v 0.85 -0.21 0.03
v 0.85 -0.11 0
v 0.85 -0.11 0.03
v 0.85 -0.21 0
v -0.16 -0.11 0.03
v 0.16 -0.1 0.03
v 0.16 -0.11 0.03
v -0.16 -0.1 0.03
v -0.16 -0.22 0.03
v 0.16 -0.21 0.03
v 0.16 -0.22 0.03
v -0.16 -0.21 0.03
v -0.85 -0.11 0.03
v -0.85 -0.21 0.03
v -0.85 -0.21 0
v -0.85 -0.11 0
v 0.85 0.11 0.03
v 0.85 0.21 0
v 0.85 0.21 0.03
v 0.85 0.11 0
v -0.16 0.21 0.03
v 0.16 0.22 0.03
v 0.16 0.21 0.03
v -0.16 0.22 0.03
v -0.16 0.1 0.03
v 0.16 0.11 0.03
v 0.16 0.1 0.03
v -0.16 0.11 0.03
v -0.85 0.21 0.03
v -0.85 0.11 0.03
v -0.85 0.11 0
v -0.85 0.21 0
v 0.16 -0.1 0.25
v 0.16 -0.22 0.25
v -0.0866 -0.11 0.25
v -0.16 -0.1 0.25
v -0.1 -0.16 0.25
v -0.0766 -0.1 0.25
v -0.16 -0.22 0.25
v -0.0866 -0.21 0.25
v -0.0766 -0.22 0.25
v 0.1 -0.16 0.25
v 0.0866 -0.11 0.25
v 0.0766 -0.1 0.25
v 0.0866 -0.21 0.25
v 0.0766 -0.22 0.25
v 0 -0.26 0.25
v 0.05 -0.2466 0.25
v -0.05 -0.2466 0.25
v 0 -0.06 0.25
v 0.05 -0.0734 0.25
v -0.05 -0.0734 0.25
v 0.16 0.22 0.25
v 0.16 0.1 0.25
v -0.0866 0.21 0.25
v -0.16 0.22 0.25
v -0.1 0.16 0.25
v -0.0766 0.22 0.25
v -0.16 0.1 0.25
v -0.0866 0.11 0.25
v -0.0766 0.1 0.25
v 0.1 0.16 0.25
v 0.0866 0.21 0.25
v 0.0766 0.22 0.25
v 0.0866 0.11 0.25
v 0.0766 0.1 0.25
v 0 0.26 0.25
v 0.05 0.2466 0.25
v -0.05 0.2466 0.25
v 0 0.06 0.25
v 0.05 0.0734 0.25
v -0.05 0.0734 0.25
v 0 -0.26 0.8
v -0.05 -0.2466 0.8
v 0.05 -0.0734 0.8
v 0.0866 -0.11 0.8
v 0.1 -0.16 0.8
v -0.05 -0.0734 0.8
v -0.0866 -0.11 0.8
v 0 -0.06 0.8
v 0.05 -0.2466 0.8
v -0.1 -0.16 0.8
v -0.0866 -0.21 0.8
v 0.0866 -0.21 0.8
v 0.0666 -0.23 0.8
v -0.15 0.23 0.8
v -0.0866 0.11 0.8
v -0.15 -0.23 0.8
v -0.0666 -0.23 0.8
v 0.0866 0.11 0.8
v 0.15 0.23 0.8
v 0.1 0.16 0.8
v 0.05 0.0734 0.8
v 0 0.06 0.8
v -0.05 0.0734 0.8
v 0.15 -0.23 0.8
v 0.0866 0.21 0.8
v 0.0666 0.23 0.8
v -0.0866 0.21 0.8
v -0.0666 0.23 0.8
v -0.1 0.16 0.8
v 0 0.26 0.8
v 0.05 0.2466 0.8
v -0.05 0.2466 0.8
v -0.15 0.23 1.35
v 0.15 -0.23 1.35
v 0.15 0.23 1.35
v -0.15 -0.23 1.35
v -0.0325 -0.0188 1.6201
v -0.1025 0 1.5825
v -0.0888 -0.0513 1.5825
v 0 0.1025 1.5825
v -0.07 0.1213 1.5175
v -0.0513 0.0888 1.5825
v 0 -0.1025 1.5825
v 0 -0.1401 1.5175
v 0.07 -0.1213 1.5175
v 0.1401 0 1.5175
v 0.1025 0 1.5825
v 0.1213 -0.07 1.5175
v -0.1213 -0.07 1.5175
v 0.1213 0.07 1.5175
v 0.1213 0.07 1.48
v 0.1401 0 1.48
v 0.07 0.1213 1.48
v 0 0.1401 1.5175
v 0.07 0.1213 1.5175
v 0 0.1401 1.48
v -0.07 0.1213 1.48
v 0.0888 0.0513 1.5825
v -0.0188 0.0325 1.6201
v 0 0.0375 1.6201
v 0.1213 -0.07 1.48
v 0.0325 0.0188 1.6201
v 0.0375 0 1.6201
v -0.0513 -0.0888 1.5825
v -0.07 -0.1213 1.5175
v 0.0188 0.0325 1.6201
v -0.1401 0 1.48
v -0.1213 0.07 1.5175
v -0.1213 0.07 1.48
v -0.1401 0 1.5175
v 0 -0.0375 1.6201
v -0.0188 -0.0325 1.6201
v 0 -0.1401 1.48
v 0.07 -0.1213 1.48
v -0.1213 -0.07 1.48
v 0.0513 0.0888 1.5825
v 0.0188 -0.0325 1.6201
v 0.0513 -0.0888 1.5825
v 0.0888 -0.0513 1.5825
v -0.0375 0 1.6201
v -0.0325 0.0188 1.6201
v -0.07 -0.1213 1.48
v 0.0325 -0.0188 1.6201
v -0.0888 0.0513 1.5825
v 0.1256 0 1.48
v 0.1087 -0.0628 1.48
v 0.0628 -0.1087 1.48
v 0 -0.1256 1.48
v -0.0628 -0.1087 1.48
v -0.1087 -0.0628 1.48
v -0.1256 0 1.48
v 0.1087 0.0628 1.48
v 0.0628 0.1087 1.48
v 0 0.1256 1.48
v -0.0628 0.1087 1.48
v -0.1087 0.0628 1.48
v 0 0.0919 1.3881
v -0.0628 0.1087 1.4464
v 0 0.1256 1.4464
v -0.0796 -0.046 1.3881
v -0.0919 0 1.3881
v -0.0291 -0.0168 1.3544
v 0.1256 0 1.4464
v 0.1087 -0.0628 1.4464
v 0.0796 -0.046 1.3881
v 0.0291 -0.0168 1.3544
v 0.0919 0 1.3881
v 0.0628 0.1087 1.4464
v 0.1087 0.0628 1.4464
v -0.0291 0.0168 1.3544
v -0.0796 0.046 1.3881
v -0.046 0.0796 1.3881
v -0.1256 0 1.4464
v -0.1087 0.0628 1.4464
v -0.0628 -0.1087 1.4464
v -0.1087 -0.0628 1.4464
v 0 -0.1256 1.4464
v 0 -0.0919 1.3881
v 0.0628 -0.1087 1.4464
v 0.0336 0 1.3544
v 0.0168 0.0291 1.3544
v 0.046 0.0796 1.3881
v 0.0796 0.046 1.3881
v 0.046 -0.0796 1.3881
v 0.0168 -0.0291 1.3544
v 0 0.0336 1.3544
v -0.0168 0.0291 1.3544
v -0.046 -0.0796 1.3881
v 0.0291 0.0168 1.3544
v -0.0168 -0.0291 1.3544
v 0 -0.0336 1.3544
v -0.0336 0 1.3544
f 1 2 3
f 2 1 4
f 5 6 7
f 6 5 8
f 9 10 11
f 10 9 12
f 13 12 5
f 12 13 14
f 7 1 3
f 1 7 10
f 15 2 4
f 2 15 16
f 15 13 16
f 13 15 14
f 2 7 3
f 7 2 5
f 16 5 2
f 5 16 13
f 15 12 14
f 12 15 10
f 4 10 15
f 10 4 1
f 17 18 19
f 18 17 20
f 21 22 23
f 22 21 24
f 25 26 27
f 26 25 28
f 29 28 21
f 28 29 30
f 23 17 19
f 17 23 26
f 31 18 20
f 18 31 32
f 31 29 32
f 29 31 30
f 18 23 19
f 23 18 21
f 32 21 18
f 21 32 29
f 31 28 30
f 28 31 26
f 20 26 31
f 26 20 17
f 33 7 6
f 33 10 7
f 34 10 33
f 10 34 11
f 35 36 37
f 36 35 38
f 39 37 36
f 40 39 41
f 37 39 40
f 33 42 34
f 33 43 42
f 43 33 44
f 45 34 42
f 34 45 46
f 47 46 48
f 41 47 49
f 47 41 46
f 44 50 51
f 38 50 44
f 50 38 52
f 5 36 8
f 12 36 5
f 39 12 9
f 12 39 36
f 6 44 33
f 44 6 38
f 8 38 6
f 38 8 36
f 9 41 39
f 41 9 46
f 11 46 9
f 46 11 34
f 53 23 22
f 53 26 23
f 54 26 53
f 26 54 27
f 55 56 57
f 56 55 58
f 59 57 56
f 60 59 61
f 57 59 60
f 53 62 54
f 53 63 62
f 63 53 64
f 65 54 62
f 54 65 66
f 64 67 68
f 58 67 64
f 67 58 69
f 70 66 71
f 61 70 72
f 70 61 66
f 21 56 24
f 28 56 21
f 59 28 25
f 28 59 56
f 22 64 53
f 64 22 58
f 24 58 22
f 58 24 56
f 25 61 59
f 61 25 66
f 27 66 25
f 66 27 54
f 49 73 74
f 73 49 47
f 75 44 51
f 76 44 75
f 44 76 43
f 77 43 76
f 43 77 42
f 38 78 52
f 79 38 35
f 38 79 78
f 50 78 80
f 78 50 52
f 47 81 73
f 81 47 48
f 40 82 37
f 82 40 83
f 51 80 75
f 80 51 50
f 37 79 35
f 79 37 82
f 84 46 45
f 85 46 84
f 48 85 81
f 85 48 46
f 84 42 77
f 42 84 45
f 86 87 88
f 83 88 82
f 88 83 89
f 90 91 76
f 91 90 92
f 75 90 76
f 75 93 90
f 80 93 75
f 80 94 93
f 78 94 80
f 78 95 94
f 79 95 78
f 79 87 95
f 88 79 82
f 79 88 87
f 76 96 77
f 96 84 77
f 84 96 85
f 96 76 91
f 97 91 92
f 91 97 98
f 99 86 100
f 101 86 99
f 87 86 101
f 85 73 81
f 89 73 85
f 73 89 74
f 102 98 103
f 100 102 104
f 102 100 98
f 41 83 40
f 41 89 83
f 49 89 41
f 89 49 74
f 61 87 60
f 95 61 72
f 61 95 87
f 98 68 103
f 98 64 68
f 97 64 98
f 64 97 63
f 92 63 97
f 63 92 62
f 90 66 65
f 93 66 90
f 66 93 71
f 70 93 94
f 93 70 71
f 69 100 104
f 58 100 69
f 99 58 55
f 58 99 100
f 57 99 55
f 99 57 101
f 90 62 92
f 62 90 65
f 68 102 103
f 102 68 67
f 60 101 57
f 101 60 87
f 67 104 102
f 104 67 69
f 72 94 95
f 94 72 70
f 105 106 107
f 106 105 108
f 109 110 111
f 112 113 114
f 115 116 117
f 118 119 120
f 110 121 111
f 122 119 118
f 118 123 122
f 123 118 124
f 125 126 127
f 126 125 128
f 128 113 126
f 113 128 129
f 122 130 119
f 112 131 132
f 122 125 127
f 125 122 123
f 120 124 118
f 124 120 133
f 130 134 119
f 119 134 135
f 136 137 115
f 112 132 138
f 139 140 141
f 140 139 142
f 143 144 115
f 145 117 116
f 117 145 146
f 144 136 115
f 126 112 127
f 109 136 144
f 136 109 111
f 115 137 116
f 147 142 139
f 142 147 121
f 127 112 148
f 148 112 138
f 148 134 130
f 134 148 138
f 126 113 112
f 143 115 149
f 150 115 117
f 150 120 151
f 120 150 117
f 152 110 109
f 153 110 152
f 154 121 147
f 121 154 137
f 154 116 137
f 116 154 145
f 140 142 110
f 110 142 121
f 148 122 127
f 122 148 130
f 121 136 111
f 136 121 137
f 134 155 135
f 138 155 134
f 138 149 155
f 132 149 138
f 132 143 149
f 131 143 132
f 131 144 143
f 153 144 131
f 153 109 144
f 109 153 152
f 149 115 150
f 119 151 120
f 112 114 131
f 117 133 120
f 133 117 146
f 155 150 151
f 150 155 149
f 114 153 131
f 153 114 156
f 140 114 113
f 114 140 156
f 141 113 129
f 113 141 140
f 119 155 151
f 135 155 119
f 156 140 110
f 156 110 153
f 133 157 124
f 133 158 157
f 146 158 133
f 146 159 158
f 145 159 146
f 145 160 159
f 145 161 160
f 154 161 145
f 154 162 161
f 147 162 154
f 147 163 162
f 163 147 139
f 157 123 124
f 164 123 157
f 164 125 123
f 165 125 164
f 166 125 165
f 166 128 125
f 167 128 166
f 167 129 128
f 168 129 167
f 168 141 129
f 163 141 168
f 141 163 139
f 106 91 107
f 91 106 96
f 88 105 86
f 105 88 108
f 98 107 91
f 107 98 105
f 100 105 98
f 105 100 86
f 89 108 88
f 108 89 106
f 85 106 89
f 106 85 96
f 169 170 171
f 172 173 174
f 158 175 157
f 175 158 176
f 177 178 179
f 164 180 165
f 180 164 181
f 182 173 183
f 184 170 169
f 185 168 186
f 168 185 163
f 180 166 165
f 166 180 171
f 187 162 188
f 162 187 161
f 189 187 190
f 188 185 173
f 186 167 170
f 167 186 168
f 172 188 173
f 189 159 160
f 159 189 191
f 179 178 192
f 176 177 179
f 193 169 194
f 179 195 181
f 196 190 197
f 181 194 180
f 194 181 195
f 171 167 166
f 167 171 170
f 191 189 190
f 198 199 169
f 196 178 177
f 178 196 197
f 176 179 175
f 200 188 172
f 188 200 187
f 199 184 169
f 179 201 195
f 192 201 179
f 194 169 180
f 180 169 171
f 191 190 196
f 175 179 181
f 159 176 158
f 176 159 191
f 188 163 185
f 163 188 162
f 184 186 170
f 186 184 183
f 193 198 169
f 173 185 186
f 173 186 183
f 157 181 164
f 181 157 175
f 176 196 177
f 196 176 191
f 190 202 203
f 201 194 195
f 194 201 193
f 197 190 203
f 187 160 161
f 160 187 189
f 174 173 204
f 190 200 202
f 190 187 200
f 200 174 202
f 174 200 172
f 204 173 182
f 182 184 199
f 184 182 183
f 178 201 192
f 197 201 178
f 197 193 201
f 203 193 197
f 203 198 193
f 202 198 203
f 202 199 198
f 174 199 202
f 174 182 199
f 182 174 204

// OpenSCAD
// Skier — stylised standing figure on skis. One instance is drawn per
// world.Agent every frame via the dynamic batch; the shader rotates
// around world Y so the +X (forward) axis aligns with the agent's
// heading. The mesh is therefore authored as a generic skier facing
// down the +X axis.
//
// Conventions, units, and axis docs: see models-src/README.md.
//
//   +X = forward (direction the skier is travelling)
//   +Y = lateral (skier's left when facing +X)
//   +Z = up
//
// Sized for a 1.7 m tall adult on a pair of 1.7 m skis. The pose is a
// neutral upright stance — bent knees and forward lean look better but
// add joints the simple primitive shapes can't easily express, and at
// game scale the skier reads as "a person on skis" either way.
//
// Per-vertex colours are NOT kept near-white: the dynamic batch's
// ColorTint is used to convey activity state (Walking / Queuing /
// On Lift / etc., see agentColor in render/renderer.go), so each
// part has its own muted colour that the per-instance tint can darken
// or lighten on top.

$fn = 12;

// ── Dimensions (metres) ────────────────────────────────────────────────
ski_len = 1.70; // typical adult length
ski_w   = 0.10; // ski width (along Y)
ski_h   = 0.03; // ski thickness
ski_gap = 0.16; // half the distance between the two skis along Y

boot_len = 0.32; // along X
boot_w   = 0.12; // along Y, slightly wider than the ski
boot_h   = 0.22; // ankle-height

leg_r = 0.10;
leg_h = 0.55; // boot top → hip

torso_d = 0.30; // along X (chest depth)
torso_w = 0.46; // along Y (shoulder width)
torso_h = 0.55; // hip → top of shoulders

head_r = 0.13;

arm_r       = 0.07;
arm_h       = 0.55;
arm_shoulder_y = torso_w / 2 - arm_r; // arms hang from shoulder edge

// Derived Z coordinates (everything stacks on top of the skis).
ski_top   = ski_h;
boot_top  = ski_top + boot_h;
leg_top   = boot_top + leg_h;
torso_top = leg_top + torso_h;

// ── Parts ──────────────────────────────────────────────────────────────
module skis() {
    color([0.18, 0.20, 0.24]) // dark slate
    for (y = [-ski_gap, +ski_gap])
        translate([0, y, ski_h / 2])
            cube([ski_len, ski_w, ski_h], center = true);
}

module boots() {
    color([0.10, 0.10, 0.12])
    for (y = [-ski_gap, +ski_gap])
        translate([0, y, ski_top + boot_h / 2])
            cube([boot_len, boot_w, boot_h], center = true);
}

module legs() {
    color([0.20, 0.22, 0.30]) // dark pants
    for (y = [-ski_gap, +ski_gap])
        translate([0, y, boot_top + leg_h / 2])
            cylinder(h = leg_h, r = leg_r, center = true);
}

module torso() {
    color([0.85, 0.30, 0.30]) // ski-jacket red — readable from above
    translate([0, 0, leg_top + torso_h / 2])
        cube([torso_d, torso_w, torso_h], center = true);
}

module arms() {
    color([0.85, 0.30, 0.30]) // matches jacket
    for (y = [-arm_shoulder_y, +arm_shoulder_y])
        translate([0, y, leg_top + torso_h - arm_h / 2])
            cylinder(h = arm_h, r = arm_r, center = true);
}

module head() {
    color([0.95, 0.80, 0.65]) // fair skin
    translate([0, 0, torso_top + head_r])
        sphere(r = head_r);
}

module helmet() {
    color([0.15, 0.15, 0.18])
    translate([0, 0, torso_top + head_r])
        // Half-sphere covering the top of the head.
        difference() {
            sphere(r = head_r + 0.015);
            translate([0, 0, -head_r])
                cube([head_r * 3, head_r * 3, head_r * 2], center = true);
        }
}

module skier() {
    skis();
    boots();
    legs();
    torso();
    arms();
    head();
    helmet();
}

skier();
